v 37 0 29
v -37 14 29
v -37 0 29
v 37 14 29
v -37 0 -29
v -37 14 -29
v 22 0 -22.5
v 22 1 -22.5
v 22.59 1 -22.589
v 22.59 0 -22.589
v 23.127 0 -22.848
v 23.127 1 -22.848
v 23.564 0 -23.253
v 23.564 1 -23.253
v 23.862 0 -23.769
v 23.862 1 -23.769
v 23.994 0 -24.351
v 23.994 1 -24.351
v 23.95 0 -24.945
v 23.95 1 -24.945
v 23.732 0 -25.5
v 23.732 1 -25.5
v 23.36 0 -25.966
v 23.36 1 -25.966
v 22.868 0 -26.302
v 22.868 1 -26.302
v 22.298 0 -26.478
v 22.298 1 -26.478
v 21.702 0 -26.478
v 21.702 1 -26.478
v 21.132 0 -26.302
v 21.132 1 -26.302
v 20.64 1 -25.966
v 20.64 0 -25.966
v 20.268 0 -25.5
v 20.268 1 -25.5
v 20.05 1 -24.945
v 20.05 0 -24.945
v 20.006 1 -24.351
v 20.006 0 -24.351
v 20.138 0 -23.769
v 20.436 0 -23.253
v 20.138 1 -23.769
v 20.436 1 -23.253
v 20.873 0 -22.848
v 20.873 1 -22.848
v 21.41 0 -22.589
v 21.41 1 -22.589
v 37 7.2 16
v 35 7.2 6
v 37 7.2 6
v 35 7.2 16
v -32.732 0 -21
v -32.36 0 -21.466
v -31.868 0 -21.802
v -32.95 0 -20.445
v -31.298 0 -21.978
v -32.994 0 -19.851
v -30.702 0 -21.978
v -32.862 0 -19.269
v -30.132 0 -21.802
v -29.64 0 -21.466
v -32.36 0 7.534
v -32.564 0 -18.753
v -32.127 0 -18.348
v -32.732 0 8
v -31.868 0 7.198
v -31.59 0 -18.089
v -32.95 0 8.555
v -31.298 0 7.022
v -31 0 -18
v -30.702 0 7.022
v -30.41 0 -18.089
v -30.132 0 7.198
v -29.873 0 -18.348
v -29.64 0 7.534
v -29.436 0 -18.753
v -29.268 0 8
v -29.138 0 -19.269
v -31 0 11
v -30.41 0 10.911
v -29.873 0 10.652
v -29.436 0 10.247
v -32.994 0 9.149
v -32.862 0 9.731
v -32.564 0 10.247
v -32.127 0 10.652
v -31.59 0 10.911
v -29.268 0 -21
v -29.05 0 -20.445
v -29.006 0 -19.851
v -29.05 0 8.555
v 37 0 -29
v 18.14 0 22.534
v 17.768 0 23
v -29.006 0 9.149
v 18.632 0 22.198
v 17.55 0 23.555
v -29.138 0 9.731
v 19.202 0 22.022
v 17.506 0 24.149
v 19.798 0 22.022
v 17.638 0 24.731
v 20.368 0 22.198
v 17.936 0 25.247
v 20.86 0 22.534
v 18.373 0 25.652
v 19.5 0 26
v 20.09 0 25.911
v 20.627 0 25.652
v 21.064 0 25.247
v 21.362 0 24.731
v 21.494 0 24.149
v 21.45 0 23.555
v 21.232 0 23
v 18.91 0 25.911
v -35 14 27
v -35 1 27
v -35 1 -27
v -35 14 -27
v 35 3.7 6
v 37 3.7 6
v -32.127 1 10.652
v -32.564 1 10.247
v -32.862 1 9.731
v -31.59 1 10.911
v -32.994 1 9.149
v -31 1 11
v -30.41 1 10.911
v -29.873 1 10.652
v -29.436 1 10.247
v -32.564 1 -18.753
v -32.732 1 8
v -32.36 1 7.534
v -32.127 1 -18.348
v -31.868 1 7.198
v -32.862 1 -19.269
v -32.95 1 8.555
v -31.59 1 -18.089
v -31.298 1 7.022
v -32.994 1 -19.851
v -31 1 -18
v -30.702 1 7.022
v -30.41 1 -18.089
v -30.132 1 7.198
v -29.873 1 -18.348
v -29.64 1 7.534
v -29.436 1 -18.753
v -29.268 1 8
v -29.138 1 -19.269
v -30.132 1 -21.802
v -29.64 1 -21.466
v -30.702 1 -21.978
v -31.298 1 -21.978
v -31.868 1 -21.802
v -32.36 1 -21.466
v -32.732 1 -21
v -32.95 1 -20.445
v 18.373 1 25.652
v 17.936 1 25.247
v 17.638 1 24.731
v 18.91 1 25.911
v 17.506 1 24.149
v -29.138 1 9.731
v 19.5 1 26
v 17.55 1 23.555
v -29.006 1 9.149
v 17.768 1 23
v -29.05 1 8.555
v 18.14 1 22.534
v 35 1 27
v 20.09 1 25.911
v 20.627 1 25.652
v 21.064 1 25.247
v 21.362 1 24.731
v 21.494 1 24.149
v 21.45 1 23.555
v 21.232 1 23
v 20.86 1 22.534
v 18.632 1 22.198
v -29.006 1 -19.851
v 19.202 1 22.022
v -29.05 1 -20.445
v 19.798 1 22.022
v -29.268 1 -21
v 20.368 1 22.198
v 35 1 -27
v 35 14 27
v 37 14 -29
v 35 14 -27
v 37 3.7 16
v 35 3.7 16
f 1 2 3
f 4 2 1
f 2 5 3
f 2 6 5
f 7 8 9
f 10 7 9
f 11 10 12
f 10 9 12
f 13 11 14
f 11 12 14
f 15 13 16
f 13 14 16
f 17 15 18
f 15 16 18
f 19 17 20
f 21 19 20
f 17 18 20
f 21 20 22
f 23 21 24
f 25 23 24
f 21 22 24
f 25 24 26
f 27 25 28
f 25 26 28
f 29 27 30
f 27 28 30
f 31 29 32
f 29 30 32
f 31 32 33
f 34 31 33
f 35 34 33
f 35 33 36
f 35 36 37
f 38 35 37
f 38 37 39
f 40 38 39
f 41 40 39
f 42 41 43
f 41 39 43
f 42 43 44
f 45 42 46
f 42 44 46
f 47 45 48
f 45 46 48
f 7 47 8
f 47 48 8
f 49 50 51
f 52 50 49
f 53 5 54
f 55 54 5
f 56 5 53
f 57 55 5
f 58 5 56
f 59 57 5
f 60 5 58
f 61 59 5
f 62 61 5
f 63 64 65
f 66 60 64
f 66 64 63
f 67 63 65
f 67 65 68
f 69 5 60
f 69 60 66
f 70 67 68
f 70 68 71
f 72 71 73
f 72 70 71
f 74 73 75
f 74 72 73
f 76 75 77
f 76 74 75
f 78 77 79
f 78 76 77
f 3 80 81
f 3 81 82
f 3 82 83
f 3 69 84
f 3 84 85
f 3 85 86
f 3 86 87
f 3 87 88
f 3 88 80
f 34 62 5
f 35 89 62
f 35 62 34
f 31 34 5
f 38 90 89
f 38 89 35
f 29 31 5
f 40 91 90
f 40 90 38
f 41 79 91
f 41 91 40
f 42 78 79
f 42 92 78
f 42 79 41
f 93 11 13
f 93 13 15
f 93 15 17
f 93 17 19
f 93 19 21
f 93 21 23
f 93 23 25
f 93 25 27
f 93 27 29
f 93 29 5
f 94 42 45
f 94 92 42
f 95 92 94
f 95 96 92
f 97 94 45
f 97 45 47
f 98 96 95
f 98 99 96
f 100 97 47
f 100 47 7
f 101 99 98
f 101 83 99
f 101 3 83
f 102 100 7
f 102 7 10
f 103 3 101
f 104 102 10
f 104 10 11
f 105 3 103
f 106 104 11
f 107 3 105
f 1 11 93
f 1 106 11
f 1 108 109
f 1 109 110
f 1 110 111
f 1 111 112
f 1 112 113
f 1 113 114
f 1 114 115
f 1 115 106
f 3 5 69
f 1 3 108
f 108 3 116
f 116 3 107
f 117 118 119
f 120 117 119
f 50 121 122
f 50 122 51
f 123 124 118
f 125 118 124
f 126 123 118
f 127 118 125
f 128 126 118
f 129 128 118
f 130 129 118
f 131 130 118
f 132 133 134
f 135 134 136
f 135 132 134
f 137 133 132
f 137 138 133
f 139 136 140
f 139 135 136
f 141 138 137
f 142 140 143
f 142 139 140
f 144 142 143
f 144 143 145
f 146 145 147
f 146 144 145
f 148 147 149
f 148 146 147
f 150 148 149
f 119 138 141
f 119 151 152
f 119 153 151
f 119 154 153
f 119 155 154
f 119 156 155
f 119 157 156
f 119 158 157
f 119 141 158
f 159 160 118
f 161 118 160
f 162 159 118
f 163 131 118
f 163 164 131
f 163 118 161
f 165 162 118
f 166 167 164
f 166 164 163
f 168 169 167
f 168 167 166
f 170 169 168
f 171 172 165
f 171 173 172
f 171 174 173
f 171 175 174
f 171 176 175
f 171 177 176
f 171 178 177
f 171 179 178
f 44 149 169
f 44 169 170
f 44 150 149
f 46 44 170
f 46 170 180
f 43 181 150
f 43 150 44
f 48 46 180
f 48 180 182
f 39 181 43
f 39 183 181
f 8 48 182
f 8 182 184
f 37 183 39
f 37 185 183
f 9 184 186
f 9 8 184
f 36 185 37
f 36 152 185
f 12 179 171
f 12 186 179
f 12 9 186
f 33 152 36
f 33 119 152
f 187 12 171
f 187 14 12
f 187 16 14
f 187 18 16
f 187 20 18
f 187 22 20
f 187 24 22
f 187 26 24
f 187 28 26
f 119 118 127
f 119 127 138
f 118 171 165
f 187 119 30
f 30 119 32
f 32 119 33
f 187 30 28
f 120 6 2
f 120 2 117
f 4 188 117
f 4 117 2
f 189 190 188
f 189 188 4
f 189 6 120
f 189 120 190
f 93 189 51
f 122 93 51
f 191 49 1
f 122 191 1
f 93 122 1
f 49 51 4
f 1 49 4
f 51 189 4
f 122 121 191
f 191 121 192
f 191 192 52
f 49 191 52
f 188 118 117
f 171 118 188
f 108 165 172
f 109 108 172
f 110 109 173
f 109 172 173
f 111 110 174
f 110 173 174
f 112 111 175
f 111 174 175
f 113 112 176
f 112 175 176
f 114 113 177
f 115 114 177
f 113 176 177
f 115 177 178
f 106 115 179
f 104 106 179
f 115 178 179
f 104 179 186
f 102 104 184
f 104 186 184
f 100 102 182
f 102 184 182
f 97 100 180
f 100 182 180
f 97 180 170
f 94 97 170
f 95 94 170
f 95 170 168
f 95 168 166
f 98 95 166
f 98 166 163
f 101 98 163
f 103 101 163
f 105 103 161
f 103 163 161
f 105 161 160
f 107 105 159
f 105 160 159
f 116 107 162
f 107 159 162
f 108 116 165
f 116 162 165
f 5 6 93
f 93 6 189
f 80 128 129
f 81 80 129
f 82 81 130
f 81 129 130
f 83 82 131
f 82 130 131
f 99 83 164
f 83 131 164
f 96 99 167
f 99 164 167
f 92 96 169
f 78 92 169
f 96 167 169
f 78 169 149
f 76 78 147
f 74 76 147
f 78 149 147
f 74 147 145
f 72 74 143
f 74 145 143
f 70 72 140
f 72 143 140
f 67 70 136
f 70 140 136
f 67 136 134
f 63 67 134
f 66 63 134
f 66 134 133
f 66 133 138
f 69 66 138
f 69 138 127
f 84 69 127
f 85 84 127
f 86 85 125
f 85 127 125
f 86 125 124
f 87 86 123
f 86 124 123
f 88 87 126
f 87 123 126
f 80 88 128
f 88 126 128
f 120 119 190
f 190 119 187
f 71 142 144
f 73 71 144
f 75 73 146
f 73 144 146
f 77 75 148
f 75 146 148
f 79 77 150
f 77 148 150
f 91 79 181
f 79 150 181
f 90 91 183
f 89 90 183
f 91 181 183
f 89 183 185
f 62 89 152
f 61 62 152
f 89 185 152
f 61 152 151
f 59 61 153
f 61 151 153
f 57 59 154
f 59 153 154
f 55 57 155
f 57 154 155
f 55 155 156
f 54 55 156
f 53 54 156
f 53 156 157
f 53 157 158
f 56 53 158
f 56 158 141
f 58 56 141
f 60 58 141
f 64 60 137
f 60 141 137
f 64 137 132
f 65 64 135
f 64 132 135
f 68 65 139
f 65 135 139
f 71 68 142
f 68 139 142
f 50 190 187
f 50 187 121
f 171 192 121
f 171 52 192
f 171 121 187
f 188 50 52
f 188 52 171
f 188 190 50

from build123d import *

# Parameters (mm, degrees)
IZIM1_W                     = 72
IZIM1_H                     = 56
Y_KSEKLIK_EKSTR_ZYON2_DEPTH = 1
IZIM3_W                     = 72
IZIM3_H                     = 56
IZIM3_W_2                   = 70
IZIM3_H_2                   = 54
EKSTR_ZYON_NCE2_DEPTH       = 13
IZIM4_W                     = 10
IZIM4_H                     = 4
KES_EKSTR_ZYON1_DEPTH       = 1
IZIM5_R                     = 2
KES_EKSTR_ZYON2_DEPTH       = 1
IZIM6_W                     = 1
IZIM6_H                     = 14
Y_KSEKLIK_EKSTR_ZYON3_DEPTH = 56
IZIM7_W                     = 10
IZIM7_H                     = 3
KES_EKSTR_ZYON3_DEPTH       = 1
IZIM8_W                     = 74
IZIM8_H                     = 58
IZIM8_W_2                   = 72
IZIM8_H_2                   = 56
EKSTR_ZYON_NCE4_DEPTH       = 13
IZIM9_W                     = 10
IZIM9_H                     = 5
KES_EKSTR_ZYON4_DEPTH       = 1
IZIM10_W                    = 10
IZIM10_H                    = 1.5
Y_KSEKLIK_EKSTR_ZYON4_DEPTH = 2
IZIM11_W                    = 10
IZIM11_H                    = 3.5
KES_EKSTR_ZYON5_DEPTH       = 2
IZIM12_W                    = 74
IZIM12_H                    = 58
IZIM12_W_2                  = 72
IZIM12_H_2                  = 56
EKSTR_ZYON_NCE5_DEPTH       = 1


with BuildPart() as part:
    # Çizim1 → Yükseklik-Ekstrüzyon2 (new body)
    with BuildSketch(Plane(origin=(0, 0, 0), x_dir=(1, 0, 0), z_dir=(0, 1, 0))):
        Rectangle(IZIM1_W, IZIM1_H)
    extrude(amount=Y_KSEKLIK_EKSTR_ZYON2_DEPTH)

    # Çizim3 → Ekstrüzyon-İnce2 (add)
    with BuildSketch(Plane(origin=(0, 1, 0), x_dir=(1, 0, 0), z_dir=(0, 1, 0))):
        Rectangle(IZIM3_W, IZIM3_H)
        Rectangle(IZIM3_W_2, IZIM3_H_2, mode=Mode.SUBTRACT)
    extrude(amount=EKSTR_ZYON_NCE2_DEPTH)

    # Çizim4 → Kes-Ekstrüzyon1 (cut)
    with BuildSketch(Plane.ZY.offset(-35)):
        with Locations((20.9, 4)):
            Rectangle(IZIM4_W, IZIM4_H)
    extrude(amount=-KES_EKSTR_ZYON1_DEPTH, mode=Mode.SUBTRACT)

    # Çizim5 → Kes-Ekstrüzyon2 (cut)
    with BuildSketch(Plane(origin=(0, 1, 0), x_dir=(1, 0, 0), z_dir=(0, 1, 0))):
        with Locations(Location((19.5, -24, 0), (0, 0, 270))):
            Circle(IZIM5_R)
        with Locations(Location((22, 24.5, 0), (0, 0, 270))):
            Circle(IZIM5_R)
        with Locations(Location((-31, -9, 0), (0, 0, 270))):
            Circle(IZIM5_R)
        with Locations(Location((-31, 20, 0), (0, 0, 270))):
            Circle(IZIM5_R)
    extrude(amount=-KES_EKSTR_ZYON2_DEPTH, mode=Mode.SUBTRACT)

    # Çizim6 → Yükseklik-Ekstrüzyon3 (add)
    with BuildSketch(Plane.XY.offset(28)):
        with Locations((35.5, 7)):
            Rectangle(IZIM6_W, IZIM6_H)
    extrude(amount=-Y_KSEKLIK_EKSTR_ZYON3_DEPTH)

    # Çizim7 → Kes-Ekstrüzyon3 (cut)
    with BuildSketch(Plane.ZY.offset(-35)):
        with Locations((11, 3.7)):
            Rectangle(IZIM7_W, IZIM7_H)
    extrude(amount=-KES_EKSTR_ZYON3_DEPTH, mode=Mode.SUBTRACT)

    # Çizim8 → Ekstrüzyon-İnce4 (add)
    with BuildSketch(Plane(origin=(0, 1, 0), x_dir=(1, 0, 0), z_dir=(0, 1, 0))):
        Rectangle(IZIM8_W, IZIM8_H)
        Rectangle(IZIM8_W_2, IZIM8_H_2, mode=Mode.SUBTRACT)
    extrude(amount=EKSTR_ZYON_NCE4_DEPTH)

    # Çizim9 → Kes-Ekstrüzyon4 (cut)
    with BuildSketch(Plane.ZY.offset(-35)):
        with Locations((11, 4.7)):
            Rectangle(IZIM9_W, IZIM9_H)
    extrude(amount=-KES_EKSTR_ZYON4_DEPTH, mode=Mode.SUBTRACT)

    # Çizim10 → Yükseklik-Ekstrüzyon4 (add)
    with BuildSketch(Plane.ZY.offset(-35)):
        with Locations((11, 2.95)):
            Rectangle(IZIM10_W, IZIM10_H)
    extrude(amount=-Y_KSEKLIK_EKSTR_ZYON4_DEPTH)

    # Çizim11 → Kes-Ekstrüzyon5 (cut)
    with BuildSketch(Plane.ZY.offset(-35)):
        with Locations((11, 5.45)):
            Rectangle(IZIM11_W, IZIM11_H)
    extrude(amount=-KES_EKSTR_ZYON5_DEPTH, mode=Mode.SUBTRACT)

    # Çizim12 → Ekstrüzyon-İnce5 (add)
    with BuildSketch(Plane.XZ.offset(-1)):
        Rectangle(IZIM12_W, IZIM12_H)
        Rectangle(IZIM12_W_2, IZIM12_H_2, mode=Mode.SUBTRACT)
    extrude(amount=EKSTR_ZYON_NCE5_DEPTH)


solid = part.part
